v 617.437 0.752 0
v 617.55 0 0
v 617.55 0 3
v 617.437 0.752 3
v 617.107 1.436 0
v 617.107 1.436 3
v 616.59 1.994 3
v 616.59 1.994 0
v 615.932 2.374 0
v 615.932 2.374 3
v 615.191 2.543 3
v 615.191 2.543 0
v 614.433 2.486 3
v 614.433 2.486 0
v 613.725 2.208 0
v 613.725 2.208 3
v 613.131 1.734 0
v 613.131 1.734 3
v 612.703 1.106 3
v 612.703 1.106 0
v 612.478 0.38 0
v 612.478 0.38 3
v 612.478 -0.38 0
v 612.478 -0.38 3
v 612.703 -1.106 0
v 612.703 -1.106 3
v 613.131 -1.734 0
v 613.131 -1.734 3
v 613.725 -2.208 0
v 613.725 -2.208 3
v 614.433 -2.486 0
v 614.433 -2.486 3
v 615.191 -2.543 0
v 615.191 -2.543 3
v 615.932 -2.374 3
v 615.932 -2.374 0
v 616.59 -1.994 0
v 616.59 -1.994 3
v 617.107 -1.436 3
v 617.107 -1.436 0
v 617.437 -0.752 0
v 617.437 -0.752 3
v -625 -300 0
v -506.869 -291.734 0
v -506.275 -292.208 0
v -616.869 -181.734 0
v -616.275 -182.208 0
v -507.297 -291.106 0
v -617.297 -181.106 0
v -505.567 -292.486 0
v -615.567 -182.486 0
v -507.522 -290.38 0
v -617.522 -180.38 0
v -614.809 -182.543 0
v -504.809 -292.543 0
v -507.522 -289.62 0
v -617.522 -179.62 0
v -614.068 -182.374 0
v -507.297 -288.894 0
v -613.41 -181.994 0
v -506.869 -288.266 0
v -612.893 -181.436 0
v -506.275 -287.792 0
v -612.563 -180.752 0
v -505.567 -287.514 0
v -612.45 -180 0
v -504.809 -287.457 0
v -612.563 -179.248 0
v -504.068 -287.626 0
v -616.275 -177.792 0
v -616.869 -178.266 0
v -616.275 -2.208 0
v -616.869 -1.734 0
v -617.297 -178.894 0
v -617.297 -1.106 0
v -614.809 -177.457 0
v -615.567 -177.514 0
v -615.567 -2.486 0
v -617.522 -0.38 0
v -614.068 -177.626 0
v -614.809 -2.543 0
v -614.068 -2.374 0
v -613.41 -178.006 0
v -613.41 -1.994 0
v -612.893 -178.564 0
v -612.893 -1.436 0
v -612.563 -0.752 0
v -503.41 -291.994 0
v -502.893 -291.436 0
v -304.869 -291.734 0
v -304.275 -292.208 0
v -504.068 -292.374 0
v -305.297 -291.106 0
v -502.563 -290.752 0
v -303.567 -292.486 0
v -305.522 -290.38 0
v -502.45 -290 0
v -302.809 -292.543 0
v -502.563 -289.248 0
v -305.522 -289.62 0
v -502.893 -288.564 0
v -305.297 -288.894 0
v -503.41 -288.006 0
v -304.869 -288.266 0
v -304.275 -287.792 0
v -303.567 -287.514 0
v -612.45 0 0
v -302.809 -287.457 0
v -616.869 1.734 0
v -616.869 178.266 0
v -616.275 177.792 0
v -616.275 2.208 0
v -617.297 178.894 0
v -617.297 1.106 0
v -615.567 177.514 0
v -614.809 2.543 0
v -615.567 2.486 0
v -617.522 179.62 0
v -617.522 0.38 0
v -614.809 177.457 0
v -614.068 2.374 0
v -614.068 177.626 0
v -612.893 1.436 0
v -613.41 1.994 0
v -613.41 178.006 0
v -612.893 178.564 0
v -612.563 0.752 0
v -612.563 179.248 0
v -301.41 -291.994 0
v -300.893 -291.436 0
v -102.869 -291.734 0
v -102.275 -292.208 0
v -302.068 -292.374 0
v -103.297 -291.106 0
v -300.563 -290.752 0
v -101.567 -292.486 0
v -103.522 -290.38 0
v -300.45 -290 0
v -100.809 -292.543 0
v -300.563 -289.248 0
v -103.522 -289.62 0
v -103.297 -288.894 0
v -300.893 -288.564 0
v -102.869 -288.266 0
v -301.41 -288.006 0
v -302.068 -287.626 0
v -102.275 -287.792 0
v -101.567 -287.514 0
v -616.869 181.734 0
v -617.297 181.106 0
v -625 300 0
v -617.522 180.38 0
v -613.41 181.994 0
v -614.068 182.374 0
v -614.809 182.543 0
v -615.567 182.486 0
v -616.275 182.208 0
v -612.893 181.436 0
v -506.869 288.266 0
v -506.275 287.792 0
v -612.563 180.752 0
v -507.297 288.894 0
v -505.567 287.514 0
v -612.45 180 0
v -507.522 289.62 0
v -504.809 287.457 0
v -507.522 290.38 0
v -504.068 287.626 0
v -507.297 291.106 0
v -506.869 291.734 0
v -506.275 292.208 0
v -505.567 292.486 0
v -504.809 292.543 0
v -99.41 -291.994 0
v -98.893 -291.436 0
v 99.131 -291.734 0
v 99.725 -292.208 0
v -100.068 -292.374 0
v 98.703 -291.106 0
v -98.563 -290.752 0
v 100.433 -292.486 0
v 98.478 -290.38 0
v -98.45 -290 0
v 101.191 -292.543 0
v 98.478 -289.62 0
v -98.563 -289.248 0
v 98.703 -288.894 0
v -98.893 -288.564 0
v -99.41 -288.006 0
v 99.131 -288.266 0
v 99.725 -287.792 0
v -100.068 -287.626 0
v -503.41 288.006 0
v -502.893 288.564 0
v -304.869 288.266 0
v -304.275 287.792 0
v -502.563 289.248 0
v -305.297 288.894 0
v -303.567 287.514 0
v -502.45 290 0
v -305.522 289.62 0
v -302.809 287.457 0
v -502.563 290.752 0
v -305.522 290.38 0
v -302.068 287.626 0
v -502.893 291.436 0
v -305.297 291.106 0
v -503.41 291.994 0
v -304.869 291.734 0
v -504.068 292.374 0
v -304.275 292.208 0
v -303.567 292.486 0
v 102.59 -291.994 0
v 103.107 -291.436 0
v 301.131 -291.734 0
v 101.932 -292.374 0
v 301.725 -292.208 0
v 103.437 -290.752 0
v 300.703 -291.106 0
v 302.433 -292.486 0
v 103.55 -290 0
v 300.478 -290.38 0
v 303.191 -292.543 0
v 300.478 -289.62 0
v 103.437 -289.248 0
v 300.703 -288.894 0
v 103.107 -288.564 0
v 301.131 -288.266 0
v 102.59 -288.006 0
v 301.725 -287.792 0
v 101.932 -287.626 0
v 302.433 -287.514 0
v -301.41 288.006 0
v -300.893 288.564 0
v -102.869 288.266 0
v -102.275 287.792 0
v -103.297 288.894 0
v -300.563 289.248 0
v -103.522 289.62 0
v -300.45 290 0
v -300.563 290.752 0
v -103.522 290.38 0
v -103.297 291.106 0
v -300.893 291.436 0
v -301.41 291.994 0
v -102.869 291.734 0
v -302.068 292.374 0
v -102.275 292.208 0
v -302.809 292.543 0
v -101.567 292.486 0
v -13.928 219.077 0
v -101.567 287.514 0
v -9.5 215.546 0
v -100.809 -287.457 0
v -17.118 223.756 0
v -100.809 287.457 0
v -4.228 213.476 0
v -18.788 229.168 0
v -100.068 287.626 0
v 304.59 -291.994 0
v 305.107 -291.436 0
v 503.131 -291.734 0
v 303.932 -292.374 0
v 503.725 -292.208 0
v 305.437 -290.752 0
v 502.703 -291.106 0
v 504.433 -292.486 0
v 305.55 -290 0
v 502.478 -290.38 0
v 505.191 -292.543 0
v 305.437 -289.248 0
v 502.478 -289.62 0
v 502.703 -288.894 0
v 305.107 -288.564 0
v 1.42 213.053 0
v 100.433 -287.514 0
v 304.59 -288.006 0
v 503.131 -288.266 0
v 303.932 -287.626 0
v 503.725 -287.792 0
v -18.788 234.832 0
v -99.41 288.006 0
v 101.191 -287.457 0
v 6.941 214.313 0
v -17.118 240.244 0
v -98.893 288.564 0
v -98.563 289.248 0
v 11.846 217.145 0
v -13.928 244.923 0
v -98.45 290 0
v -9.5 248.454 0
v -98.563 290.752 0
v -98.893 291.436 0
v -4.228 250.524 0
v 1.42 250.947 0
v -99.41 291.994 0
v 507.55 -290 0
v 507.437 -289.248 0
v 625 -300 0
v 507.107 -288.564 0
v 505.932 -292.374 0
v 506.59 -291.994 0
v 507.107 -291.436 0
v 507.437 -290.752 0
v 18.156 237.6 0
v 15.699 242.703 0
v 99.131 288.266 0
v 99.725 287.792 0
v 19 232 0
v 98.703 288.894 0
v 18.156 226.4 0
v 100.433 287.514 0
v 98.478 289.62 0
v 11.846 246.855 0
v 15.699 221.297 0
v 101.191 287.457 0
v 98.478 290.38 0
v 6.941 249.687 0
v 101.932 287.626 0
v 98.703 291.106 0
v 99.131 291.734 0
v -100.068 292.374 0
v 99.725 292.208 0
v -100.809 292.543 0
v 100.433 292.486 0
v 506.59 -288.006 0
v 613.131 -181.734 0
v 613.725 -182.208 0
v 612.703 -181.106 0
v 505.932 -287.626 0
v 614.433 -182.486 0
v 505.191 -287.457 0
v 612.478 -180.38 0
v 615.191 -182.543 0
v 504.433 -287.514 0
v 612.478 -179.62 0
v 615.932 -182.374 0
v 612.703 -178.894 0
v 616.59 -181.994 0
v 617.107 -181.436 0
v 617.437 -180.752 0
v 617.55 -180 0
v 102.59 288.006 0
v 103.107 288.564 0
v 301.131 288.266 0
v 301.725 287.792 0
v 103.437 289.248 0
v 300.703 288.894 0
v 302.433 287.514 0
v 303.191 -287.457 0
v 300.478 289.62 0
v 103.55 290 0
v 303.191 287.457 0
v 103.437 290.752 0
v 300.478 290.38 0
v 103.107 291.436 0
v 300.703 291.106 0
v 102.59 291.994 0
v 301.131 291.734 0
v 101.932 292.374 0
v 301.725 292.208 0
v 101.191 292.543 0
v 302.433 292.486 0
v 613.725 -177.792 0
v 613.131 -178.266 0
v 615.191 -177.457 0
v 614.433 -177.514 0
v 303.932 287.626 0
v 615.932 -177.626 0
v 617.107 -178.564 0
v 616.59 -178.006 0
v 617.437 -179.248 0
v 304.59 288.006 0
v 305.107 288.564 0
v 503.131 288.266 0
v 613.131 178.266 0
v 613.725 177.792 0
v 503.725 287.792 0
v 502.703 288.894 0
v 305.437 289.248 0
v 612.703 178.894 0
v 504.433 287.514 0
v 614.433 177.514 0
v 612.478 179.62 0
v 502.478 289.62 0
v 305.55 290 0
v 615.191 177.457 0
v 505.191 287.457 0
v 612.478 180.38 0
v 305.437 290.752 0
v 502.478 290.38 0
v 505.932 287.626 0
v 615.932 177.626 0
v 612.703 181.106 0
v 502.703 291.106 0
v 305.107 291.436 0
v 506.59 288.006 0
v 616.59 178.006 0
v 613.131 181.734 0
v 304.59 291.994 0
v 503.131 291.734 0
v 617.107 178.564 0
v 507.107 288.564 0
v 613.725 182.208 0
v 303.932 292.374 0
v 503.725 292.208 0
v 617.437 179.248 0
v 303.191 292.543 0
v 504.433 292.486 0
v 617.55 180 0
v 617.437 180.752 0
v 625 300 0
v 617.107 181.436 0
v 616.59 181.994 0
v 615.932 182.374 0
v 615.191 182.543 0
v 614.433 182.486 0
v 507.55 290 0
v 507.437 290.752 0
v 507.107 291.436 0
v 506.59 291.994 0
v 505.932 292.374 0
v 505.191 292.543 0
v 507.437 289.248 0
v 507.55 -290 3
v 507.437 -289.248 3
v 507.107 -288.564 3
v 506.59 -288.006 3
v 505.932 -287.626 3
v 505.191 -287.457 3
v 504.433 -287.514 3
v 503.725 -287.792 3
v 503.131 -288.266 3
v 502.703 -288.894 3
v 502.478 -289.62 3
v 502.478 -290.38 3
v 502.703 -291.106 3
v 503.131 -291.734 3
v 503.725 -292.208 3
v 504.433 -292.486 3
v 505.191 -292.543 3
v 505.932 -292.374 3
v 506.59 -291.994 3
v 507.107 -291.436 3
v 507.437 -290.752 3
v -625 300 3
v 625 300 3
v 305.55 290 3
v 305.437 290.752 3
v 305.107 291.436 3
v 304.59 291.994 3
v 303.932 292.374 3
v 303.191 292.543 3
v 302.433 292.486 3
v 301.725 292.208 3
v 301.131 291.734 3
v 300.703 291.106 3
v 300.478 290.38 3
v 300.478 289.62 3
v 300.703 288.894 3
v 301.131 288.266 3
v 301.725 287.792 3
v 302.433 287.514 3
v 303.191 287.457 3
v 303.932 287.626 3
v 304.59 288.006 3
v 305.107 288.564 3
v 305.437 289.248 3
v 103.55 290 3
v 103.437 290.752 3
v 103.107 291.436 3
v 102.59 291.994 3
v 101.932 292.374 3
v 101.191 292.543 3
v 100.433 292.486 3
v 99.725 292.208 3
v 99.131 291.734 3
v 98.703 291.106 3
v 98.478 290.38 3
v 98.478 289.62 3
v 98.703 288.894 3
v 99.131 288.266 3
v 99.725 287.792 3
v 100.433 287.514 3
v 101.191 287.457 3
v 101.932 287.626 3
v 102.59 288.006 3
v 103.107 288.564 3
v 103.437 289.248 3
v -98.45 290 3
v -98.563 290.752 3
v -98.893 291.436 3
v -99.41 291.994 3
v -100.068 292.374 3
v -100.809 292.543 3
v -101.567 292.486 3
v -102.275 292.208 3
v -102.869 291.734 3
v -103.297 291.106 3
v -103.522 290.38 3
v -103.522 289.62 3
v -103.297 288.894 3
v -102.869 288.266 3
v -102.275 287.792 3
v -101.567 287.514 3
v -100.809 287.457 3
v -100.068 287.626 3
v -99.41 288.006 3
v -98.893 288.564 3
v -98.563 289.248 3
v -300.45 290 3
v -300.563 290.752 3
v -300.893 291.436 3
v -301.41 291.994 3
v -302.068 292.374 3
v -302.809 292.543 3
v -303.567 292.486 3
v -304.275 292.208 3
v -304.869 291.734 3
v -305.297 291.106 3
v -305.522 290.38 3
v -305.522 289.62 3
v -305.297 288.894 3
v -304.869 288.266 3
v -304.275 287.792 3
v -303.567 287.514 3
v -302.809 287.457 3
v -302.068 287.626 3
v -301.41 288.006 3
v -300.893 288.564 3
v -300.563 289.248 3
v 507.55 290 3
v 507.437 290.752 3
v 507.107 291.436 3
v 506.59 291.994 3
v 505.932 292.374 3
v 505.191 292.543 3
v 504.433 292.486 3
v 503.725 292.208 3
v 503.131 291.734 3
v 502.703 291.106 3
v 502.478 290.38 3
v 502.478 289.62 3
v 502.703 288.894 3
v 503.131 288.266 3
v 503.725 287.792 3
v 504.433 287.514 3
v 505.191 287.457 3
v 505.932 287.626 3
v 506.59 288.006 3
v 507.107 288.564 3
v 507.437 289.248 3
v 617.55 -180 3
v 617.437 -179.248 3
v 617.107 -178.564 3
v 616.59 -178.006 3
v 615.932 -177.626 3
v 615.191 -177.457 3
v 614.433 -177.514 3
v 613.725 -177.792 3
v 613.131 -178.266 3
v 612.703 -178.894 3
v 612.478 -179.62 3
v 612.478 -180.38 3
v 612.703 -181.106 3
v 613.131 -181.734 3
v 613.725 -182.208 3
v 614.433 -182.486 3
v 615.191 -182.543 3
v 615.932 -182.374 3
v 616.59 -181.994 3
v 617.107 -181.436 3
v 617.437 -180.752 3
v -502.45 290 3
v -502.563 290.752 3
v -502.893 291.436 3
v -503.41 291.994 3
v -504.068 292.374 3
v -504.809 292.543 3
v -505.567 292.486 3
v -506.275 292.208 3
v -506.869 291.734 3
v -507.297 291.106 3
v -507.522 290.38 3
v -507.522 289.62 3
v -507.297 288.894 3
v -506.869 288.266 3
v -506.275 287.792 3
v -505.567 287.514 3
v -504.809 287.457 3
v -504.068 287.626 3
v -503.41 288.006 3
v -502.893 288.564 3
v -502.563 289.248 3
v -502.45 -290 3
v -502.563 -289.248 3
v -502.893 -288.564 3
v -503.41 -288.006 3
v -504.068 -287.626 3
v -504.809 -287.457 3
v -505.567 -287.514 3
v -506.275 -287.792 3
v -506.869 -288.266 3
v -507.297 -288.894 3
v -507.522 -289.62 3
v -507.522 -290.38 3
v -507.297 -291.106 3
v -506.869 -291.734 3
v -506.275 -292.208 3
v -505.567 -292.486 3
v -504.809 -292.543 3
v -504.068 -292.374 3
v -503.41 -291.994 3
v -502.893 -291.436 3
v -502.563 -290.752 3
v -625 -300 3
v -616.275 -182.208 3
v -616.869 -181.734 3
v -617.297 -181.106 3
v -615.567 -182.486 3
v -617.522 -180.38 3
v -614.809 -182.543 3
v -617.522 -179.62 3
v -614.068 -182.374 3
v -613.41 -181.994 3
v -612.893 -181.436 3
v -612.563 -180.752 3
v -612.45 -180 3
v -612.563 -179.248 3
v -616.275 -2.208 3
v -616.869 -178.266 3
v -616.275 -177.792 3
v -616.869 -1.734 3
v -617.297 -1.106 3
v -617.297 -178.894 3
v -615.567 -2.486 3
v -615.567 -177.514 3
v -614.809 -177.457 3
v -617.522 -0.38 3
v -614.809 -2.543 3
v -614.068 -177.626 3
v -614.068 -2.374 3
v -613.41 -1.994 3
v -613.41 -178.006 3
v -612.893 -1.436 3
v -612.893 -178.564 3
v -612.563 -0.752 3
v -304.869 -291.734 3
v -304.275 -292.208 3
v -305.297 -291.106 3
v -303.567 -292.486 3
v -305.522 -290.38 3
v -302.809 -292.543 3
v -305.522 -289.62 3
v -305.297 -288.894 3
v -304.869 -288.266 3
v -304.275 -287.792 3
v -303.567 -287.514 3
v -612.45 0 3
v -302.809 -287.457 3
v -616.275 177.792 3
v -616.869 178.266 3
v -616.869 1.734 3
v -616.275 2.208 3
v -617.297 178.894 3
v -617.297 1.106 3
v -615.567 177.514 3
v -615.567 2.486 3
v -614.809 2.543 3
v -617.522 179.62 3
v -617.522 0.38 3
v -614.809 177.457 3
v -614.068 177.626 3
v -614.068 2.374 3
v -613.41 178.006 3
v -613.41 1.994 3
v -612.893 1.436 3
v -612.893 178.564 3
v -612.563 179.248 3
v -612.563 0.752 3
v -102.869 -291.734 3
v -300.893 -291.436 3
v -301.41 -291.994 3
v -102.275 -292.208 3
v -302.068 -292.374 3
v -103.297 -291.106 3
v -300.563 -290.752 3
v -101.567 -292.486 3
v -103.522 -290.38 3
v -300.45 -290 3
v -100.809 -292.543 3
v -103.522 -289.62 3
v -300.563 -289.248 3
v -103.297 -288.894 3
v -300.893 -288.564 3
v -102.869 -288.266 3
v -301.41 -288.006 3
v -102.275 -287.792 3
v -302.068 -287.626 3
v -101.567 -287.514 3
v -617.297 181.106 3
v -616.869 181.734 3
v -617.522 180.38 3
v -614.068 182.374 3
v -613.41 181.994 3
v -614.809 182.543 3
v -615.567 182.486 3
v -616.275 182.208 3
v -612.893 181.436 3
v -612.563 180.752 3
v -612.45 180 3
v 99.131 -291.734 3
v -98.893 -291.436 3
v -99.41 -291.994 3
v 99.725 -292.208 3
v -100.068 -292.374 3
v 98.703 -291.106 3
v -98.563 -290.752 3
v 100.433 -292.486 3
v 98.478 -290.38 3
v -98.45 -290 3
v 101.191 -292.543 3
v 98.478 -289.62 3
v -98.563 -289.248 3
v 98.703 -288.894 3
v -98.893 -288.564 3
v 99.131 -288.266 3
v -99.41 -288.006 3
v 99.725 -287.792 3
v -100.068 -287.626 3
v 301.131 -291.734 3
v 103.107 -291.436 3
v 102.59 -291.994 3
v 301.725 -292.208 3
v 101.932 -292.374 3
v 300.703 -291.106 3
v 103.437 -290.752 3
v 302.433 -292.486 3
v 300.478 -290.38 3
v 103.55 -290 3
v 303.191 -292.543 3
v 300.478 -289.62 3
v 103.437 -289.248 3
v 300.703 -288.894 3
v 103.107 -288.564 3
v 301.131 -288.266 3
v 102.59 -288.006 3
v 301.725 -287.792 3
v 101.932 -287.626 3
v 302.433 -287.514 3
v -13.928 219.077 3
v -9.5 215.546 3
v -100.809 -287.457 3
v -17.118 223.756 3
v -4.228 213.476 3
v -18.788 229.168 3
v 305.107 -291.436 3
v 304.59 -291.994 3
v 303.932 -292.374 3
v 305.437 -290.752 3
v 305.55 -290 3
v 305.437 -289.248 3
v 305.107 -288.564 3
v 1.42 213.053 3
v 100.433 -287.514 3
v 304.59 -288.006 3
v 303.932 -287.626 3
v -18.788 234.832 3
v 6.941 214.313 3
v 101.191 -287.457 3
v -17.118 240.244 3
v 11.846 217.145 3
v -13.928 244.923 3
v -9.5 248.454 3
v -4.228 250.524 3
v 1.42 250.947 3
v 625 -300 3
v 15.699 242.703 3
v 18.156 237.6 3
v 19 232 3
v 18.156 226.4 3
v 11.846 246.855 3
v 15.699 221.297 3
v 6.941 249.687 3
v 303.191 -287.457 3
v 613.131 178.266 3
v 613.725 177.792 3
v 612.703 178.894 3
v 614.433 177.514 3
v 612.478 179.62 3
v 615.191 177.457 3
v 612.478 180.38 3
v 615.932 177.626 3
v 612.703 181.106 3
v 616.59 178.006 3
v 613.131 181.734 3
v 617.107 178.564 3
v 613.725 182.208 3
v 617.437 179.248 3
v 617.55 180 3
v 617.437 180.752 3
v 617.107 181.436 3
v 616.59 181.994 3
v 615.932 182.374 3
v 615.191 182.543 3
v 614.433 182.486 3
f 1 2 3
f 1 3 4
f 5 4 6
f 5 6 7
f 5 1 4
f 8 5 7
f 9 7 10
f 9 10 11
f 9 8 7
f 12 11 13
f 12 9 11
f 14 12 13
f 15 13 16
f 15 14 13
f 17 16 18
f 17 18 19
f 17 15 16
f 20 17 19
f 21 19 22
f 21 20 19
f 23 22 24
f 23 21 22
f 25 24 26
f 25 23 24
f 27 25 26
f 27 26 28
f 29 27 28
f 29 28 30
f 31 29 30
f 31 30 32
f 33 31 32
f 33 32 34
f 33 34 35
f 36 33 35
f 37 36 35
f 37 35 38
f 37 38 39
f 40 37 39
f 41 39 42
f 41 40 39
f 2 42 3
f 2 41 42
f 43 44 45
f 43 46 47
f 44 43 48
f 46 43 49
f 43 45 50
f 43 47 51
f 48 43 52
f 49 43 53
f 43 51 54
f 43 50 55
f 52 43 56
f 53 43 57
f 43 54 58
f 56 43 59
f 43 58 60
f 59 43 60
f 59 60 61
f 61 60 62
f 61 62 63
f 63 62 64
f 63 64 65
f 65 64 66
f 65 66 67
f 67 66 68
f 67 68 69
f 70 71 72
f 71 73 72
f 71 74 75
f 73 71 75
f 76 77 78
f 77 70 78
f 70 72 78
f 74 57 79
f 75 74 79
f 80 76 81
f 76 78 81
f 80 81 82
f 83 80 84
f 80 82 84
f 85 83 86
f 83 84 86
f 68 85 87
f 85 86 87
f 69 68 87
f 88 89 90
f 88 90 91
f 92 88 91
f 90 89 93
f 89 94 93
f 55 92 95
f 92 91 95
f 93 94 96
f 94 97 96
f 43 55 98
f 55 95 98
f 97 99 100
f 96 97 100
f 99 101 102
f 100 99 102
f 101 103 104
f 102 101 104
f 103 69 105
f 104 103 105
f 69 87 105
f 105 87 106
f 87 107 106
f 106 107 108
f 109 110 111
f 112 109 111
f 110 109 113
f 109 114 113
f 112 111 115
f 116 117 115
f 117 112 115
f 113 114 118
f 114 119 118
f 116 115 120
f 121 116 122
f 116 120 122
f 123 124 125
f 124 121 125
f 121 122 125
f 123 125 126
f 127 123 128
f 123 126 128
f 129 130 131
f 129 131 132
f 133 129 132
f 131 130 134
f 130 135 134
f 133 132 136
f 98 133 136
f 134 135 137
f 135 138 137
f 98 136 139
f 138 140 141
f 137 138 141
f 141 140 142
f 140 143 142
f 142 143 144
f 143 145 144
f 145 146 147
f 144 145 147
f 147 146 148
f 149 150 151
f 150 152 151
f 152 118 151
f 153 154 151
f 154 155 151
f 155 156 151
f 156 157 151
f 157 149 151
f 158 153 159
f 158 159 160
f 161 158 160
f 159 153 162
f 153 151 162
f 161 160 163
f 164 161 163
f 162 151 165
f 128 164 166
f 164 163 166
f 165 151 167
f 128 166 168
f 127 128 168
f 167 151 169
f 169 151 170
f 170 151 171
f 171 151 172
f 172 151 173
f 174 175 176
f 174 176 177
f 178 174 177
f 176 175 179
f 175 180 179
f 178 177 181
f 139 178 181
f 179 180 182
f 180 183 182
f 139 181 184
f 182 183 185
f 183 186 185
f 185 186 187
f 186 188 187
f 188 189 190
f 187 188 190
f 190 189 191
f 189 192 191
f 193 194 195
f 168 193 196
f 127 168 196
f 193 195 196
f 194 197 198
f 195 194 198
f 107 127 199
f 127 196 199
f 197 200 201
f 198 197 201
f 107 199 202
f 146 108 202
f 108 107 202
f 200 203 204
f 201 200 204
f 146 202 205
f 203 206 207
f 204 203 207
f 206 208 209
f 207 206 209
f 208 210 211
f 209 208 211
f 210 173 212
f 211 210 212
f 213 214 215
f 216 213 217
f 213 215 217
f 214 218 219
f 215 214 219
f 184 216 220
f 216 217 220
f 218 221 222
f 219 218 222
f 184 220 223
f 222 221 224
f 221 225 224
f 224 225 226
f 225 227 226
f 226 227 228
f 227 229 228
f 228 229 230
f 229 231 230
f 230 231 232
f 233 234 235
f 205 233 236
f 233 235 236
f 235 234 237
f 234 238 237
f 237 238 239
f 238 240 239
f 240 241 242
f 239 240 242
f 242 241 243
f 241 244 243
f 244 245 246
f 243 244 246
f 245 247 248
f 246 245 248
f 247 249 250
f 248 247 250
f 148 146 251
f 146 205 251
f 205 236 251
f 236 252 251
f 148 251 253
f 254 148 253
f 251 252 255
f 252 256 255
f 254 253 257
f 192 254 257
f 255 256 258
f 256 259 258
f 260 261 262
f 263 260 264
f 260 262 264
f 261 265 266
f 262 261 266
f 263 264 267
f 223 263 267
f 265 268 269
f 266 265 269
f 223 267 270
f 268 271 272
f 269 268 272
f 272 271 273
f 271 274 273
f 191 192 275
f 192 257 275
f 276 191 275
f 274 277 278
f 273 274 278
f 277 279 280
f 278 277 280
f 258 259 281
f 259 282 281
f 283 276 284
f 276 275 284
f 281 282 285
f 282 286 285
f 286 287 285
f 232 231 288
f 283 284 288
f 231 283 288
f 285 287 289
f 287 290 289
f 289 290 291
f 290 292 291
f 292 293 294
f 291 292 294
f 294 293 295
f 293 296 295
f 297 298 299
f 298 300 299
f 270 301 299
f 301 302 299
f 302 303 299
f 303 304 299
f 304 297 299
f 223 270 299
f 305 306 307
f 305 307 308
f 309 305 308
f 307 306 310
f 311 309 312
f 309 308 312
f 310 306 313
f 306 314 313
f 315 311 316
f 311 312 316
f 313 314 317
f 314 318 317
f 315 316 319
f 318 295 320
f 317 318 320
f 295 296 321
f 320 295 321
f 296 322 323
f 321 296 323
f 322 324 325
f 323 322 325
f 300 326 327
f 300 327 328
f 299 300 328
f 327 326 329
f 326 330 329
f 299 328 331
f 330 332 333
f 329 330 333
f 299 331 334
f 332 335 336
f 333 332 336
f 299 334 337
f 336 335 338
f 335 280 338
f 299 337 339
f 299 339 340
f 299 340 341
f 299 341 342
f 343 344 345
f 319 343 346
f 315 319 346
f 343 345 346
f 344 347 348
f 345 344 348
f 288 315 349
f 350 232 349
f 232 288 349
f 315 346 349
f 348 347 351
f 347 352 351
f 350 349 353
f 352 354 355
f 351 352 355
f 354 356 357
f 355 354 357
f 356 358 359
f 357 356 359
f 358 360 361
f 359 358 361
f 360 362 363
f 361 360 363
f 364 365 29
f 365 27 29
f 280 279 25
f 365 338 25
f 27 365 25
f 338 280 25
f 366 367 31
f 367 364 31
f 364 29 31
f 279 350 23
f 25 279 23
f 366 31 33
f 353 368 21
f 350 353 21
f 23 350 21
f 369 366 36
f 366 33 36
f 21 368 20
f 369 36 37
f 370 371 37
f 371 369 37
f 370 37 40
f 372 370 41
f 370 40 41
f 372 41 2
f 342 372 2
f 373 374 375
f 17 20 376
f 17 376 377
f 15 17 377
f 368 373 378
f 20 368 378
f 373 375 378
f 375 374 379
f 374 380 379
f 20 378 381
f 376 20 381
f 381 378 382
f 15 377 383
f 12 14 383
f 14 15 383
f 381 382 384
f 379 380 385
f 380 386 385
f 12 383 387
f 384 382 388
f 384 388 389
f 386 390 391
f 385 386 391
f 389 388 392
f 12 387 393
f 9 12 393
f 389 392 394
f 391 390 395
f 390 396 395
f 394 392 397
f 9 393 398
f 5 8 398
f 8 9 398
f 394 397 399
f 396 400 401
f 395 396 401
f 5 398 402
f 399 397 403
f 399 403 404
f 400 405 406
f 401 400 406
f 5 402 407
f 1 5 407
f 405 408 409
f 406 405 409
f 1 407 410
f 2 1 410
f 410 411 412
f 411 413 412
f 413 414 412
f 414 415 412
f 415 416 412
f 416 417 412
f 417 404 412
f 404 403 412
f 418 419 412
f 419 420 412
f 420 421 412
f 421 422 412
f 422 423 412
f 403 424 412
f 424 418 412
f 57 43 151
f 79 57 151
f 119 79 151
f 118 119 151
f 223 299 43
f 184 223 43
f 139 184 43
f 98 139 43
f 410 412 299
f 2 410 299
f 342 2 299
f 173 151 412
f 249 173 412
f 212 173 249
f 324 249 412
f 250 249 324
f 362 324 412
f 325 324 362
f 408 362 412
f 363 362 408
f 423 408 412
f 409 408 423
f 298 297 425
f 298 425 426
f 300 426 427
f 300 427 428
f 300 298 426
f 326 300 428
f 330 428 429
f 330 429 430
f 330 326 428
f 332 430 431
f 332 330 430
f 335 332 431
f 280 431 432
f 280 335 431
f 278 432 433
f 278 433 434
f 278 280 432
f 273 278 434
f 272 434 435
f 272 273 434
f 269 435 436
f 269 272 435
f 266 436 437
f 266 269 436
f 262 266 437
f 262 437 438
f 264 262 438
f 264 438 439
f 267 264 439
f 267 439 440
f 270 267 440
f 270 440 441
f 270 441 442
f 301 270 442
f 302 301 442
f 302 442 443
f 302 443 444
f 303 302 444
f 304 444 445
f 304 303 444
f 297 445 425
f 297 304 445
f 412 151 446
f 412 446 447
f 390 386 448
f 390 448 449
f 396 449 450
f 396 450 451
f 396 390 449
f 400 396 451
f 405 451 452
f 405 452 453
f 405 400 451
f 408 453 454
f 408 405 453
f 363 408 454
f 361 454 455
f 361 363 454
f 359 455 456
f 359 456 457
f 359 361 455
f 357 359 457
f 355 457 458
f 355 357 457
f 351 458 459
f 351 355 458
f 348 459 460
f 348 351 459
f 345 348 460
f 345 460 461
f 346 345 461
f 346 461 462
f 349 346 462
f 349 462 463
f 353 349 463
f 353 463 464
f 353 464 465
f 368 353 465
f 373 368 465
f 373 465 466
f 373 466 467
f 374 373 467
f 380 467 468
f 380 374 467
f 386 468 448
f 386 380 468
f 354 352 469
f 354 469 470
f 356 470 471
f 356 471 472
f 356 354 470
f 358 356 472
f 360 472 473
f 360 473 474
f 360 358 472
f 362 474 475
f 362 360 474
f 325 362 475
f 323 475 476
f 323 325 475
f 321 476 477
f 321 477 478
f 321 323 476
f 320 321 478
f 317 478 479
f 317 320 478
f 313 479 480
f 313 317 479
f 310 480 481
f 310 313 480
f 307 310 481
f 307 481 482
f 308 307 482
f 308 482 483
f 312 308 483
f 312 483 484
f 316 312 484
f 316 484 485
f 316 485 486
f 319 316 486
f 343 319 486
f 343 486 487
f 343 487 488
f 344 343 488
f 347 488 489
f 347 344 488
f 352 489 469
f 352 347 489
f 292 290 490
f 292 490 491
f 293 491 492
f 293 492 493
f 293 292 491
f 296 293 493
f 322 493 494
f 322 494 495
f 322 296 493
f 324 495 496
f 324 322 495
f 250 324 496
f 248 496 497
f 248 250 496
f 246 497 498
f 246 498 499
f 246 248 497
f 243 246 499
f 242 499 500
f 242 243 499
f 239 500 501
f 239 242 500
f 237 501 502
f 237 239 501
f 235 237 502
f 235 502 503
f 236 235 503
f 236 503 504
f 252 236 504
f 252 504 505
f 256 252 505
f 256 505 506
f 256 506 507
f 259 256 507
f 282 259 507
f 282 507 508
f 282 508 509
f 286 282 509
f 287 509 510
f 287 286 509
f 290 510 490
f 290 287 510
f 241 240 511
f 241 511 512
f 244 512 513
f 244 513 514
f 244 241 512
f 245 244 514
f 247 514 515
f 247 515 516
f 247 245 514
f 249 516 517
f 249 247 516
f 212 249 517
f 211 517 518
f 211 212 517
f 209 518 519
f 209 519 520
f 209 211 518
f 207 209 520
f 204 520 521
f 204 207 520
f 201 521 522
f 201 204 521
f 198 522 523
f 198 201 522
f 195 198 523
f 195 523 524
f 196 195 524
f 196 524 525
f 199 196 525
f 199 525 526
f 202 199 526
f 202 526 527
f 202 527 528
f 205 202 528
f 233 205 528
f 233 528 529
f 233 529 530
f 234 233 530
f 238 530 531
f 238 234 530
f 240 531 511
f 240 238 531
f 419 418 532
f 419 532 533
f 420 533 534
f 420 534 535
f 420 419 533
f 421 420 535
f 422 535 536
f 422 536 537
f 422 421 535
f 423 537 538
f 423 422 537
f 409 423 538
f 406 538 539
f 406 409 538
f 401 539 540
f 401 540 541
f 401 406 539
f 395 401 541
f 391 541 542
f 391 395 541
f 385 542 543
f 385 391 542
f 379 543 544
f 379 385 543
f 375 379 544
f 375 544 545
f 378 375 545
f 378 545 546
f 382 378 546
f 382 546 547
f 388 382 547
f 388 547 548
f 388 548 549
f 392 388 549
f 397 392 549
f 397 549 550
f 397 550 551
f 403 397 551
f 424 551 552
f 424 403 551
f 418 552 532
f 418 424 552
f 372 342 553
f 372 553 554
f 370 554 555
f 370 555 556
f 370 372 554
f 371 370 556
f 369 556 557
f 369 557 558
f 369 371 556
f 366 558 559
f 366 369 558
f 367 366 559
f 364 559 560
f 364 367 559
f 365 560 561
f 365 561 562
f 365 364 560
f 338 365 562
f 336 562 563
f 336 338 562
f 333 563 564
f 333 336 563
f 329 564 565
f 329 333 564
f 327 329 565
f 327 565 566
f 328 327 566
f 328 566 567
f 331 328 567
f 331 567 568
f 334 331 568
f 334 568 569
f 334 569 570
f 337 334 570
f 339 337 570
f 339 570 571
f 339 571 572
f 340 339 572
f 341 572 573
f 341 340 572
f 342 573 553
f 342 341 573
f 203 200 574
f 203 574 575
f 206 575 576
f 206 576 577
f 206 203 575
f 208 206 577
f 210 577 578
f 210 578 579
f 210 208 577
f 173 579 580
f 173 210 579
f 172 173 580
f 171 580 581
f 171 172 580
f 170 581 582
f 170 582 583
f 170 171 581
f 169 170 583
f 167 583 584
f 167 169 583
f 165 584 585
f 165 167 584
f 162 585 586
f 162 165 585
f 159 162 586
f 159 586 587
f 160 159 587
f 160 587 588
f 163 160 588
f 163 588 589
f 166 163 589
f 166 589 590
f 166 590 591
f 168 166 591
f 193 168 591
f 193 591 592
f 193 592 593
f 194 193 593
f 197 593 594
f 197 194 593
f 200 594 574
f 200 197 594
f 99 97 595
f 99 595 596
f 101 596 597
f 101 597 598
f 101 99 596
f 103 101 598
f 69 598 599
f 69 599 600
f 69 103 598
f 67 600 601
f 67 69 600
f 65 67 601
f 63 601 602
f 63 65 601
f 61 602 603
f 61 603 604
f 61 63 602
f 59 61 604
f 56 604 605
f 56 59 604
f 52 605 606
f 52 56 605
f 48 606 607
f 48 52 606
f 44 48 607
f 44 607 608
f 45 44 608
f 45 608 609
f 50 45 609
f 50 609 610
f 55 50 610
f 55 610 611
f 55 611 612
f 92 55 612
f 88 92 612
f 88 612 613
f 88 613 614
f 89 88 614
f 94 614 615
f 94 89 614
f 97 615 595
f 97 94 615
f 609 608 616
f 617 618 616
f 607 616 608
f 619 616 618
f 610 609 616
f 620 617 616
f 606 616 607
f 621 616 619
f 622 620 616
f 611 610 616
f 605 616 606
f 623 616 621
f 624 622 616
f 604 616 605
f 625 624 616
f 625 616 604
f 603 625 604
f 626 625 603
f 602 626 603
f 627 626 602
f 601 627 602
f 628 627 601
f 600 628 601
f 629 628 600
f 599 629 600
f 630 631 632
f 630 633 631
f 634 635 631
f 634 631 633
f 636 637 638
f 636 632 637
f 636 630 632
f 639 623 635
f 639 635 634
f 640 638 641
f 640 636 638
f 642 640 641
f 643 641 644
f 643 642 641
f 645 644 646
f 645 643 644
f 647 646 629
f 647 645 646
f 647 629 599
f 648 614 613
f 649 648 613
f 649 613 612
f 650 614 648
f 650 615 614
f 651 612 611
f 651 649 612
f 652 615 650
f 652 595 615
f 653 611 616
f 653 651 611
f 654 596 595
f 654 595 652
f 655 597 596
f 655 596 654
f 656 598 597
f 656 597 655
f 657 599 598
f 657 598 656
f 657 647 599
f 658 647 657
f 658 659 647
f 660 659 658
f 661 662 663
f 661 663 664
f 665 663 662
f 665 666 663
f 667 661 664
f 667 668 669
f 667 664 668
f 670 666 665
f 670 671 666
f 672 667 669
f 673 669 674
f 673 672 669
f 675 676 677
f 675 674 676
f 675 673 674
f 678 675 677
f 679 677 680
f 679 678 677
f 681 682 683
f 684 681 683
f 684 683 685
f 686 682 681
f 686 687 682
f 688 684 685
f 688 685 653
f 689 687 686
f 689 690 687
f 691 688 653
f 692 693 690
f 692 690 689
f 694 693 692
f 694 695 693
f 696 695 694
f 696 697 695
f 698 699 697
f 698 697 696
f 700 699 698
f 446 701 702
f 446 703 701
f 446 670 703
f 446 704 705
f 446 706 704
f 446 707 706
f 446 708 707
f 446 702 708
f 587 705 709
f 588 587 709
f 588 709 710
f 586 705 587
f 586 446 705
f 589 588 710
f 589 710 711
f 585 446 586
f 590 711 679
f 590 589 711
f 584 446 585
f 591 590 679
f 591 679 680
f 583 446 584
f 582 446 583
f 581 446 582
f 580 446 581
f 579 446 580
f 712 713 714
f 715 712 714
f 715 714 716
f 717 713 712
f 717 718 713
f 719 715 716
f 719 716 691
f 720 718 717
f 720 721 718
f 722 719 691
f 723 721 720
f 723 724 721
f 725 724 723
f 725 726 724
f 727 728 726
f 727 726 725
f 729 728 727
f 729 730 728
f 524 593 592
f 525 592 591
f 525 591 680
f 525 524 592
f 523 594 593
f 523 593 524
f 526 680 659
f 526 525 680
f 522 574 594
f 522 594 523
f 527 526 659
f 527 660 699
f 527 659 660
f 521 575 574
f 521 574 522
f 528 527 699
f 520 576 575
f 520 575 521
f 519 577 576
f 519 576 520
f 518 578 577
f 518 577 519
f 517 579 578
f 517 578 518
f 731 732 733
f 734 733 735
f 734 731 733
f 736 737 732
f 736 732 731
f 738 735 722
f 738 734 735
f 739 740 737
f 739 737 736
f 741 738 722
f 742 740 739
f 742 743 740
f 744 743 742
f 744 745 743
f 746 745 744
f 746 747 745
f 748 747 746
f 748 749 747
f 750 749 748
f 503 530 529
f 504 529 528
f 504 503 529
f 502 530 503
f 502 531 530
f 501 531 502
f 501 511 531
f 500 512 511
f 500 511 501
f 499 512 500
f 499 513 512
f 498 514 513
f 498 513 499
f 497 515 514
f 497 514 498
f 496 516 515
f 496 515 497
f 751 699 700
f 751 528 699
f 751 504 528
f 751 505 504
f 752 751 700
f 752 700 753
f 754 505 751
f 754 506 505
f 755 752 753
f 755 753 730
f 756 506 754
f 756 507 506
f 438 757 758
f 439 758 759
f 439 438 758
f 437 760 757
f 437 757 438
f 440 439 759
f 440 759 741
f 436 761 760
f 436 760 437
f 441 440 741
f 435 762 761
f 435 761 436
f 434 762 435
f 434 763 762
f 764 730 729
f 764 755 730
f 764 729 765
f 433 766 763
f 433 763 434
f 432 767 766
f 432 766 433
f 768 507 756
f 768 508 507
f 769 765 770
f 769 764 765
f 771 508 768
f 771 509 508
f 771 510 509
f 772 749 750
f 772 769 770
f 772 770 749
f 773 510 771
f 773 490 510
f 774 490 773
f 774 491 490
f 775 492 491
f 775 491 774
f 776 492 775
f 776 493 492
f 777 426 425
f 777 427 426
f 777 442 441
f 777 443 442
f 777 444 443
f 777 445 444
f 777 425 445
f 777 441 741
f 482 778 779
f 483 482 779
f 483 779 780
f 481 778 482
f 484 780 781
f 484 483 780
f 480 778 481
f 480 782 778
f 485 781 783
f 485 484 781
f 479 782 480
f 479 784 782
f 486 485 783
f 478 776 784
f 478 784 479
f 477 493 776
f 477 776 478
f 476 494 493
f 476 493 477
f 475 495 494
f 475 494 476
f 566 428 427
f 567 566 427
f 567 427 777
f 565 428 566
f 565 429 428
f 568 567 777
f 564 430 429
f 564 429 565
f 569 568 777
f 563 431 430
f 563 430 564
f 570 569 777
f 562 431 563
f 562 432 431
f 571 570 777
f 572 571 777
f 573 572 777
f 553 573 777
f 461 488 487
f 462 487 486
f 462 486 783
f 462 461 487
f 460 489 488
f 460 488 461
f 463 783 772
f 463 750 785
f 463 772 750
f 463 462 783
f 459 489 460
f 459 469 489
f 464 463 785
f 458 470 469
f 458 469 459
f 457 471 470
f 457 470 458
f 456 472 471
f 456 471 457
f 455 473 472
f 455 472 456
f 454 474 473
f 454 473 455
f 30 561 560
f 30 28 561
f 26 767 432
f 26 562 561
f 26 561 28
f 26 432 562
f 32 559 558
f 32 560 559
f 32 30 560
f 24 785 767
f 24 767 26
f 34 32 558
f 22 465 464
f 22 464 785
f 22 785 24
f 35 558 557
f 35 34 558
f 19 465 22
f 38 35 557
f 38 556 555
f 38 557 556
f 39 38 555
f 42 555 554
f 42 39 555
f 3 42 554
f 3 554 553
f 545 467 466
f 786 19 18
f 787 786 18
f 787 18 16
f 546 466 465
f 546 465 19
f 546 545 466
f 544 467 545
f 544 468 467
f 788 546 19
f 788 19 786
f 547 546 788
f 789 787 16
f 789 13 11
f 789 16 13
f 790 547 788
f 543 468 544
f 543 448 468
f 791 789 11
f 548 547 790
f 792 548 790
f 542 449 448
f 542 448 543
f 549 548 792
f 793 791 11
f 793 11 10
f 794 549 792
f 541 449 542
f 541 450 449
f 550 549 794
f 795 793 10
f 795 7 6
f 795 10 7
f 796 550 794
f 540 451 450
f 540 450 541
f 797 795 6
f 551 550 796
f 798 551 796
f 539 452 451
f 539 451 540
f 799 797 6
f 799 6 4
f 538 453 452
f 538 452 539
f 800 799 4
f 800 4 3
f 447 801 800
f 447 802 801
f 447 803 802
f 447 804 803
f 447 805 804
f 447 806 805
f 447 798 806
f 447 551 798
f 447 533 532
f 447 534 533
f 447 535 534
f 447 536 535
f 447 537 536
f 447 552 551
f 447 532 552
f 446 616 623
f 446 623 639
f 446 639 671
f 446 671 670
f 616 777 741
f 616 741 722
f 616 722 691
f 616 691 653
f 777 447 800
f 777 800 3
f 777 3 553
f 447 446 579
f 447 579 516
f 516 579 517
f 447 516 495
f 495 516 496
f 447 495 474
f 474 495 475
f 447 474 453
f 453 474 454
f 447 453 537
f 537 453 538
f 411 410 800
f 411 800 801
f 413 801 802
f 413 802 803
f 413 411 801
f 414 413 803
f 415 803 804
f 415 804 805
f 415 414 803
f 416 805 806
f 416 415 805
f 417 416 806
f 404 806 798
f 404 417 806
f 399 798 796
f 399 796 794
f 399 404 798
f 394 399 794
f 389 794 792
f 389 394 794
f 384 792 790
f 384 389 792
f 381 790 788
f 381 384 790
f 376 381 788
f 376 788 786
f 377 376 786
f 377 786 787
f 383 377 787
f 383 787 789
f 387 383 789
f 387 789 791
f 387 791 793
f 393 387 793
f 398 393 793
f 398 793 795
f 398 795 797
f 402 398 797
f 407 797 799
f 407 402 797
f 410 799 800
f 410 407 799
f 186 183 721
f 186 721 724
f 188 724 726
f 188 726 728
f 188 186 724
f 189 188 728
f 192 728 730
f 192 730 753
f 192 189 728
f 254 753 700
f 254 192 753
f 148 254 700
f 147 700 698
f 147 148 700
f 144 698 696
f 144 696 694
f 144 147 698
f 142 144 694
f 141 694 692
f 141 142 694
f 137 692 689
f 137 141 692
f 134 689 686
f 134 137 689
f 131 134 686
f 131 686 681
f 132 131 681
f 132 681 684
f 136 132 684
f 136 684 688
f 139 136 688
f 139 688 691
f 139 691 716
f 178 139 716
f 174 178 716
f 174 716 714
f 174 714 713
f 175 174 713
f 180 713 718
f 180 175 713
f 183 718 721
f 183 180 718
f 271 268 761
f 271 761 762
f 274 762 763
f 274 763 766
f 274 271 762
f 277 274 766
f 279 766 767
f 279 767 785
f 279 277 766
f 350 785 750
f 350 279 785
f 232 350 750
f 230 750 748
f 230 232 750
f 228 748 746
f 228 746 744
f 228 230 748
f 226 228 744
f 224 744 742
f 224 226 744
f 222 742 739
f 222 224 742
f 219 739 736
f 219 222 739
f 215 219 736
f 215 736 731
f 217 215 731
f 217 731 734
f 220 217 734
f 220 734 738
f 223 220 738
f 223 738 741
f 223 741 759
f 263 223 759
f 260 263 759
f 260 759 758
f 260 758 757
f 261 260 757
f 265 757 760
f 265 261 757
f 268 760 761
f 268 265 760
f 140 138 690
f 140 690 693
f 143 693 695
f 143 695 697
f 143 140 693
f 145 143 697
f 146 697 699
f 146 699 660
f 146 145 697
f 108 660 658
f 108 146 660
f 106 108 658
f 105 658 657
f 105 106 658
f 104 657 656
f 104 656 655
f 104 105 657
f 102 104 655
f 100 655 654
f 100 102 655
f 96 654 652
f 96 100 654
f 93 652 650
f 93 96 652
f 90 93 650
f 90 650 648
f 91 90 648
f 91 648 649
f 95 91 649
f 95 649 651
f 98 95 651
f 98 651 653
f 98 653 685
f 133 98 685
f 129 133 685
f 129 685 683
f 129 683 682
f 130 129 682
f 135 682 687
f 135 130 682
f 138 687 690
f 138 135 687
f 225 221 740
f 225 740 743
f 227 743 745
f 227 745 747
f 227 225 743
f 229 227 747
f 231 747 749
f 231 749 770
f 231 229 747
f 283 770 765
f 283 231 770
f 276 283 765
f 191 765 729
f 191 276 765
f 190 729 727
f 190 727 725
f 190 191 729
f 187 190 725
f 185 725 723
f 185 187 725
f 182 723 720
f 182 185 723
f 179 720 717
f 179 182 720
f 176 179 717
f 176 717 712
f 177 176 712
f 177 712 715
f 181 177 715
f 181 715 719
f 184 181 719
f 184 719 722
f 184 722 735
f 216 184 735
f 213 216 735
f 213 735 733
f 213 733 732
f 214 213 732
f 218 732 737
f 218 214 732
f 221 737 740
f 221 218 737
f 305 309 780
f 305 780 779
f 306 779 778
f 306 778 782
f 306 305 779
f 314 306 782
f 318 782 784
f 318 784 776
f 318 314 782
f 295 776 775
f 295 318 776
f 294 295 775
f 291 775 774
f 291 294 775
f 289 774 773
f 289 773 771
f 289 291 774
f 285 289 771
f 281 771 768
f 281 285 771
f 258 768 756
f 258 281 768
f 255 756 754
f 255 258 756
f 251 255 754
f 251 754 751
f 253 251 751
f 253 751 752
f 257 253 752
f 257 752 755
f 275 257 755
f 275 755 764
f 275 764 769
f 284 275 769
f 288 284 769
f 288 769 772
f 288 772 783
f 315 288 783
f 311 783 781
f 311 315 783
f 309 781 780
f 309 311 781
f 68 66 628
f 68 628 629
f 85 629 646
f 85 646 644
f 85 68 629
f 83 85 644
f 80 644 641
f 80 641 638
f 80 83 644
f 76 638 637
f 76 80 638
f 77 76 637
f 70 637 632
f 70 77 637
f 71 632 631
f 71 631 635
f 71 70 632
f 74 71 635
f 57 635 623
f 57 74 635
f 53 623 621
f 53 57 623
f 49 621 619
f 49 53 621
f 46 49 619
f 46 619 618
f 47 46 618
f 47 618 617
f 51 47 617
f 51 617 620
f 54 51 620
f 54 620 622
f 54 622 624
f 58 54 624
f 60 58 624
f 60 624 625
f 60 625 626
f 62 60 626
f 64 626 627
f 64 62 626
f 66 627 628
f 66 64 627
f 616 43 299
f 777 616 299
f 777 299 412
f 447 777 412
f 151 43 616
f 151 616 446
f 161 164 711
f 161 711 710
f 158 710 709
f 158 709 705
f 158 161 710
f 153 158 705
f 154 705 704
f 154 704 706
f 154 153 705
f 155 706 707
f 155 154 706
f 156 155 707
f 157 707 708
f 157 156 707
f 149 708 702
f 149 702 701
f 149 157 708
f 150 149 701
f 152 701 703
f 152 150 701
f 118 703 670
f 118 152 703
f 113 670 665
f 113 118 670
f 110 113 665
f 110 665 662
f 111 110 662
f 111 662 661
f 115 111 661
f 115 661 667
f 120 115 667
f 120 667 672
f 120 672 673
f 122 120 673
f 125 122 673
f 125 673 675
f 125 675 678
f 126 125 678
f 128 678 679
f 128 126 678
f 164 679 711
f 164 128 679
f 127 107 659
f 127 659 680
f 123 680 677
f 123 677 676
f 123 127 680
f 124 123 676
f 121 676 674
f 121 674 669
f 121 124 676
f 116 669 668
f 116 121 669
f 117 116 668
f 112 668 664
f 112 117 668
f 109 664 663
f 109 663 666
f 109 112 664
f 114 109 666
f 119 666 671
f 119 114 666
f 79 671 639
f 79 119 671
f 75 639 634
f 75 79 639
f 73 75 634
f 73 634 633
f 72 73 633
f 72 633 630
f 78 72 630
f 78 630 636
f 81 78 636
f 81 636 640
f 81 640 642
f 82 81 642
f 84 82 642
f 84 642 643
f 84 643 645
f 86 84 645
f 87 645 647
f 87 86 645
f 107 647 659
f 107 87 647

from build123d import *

# Parameters (mm, degrees)
SKETCH1_W           = 1250
SKETCH1_H           = 600
SKETCH1_R           = 2.55
SKETCH1_R_2         = 19
BOSS_EXTRUDE1_DEPTH = 3


with BuildPart() as part:
    # Sketch1 → Boss-Extrude1 (new body)
    with BuildSketch(Plane.XY):
        Rectangle(SKETCH1_W, SKETCH1_H)
        with Locations((303, 290)):
            Circle(SKETCH1_R, mode=Mode.SUBTRACT)
        with Locations((101, 290)):
            Circle(SKETCH1_R, mode=Mode.SUBTRACT)
        with Locations((-101, 290)):
            Circle(SKETCH1_R, mode=Mode.SUBTRACT)
        with Locations((-303, 290)):
            Circle(SKETCH1_R, mode=Mode.SUBTRACT)
        with Locations((505, 290)):
            Circle(SKETCH1_R, mode=Mode.SUBTRACT)
        with Locations((505, -290)):
            Circle(SKETCH1_R, mode=Mode.SUBTRACT)
        with Locations((-505, 290)):
            Circle(SKETCH1_R, mode=Mode.SUBTRACT)
        with Locations((303, -290)):
            Circle(SKETCH1_R, mode=Mode.SUBTRACT)
        with Locations((101, -290)):
            Circle(SKETCH1_R, mode=Mode.SUBTRACT)
        with Locations((-101, -290)):
            Circle(SKETCH1_R, mode=Mode.SUBTRACT)
        with Locations((615, 180)):
            Circle(SKETCH1_R, mode=Mode.SUBTRACT)
        with Locations((-615, 180)):
            Circle(SKETCH1_R, mode=Mode.SUBTRACT)
        with Locations((-615, 0)):
            Circle(SKETCH1_R, mode=Mode.SUBTRACT)
        with Locations((-615, -180)):
            Circle(SKETCH1_R, mode=Mode.SUBTRACT)
        with Locations((-303, -290)):
            Circle(SKETCH1_R, mode=Mode.SUBTRACT)
        with Locations((615, 0)):
            Circle(SKETCH1_R, mode=Mode.SUBTRACT)
        with Locations((615, -180)):
            Circle(SKETCH1_R, mode=Mode.SUBTRACT)
        with Locations((-505, -290)):
            Circle(SKETCH1_R, mode=Mode.SUBTRACT)
        with Locations((0, 232)):
            Circle(SKETCH1_R_2, mode=Mode.SUBTRACT)
    extrude(amount=BOSS_EXTRUDE1_DEPTH)


solid = part.part
